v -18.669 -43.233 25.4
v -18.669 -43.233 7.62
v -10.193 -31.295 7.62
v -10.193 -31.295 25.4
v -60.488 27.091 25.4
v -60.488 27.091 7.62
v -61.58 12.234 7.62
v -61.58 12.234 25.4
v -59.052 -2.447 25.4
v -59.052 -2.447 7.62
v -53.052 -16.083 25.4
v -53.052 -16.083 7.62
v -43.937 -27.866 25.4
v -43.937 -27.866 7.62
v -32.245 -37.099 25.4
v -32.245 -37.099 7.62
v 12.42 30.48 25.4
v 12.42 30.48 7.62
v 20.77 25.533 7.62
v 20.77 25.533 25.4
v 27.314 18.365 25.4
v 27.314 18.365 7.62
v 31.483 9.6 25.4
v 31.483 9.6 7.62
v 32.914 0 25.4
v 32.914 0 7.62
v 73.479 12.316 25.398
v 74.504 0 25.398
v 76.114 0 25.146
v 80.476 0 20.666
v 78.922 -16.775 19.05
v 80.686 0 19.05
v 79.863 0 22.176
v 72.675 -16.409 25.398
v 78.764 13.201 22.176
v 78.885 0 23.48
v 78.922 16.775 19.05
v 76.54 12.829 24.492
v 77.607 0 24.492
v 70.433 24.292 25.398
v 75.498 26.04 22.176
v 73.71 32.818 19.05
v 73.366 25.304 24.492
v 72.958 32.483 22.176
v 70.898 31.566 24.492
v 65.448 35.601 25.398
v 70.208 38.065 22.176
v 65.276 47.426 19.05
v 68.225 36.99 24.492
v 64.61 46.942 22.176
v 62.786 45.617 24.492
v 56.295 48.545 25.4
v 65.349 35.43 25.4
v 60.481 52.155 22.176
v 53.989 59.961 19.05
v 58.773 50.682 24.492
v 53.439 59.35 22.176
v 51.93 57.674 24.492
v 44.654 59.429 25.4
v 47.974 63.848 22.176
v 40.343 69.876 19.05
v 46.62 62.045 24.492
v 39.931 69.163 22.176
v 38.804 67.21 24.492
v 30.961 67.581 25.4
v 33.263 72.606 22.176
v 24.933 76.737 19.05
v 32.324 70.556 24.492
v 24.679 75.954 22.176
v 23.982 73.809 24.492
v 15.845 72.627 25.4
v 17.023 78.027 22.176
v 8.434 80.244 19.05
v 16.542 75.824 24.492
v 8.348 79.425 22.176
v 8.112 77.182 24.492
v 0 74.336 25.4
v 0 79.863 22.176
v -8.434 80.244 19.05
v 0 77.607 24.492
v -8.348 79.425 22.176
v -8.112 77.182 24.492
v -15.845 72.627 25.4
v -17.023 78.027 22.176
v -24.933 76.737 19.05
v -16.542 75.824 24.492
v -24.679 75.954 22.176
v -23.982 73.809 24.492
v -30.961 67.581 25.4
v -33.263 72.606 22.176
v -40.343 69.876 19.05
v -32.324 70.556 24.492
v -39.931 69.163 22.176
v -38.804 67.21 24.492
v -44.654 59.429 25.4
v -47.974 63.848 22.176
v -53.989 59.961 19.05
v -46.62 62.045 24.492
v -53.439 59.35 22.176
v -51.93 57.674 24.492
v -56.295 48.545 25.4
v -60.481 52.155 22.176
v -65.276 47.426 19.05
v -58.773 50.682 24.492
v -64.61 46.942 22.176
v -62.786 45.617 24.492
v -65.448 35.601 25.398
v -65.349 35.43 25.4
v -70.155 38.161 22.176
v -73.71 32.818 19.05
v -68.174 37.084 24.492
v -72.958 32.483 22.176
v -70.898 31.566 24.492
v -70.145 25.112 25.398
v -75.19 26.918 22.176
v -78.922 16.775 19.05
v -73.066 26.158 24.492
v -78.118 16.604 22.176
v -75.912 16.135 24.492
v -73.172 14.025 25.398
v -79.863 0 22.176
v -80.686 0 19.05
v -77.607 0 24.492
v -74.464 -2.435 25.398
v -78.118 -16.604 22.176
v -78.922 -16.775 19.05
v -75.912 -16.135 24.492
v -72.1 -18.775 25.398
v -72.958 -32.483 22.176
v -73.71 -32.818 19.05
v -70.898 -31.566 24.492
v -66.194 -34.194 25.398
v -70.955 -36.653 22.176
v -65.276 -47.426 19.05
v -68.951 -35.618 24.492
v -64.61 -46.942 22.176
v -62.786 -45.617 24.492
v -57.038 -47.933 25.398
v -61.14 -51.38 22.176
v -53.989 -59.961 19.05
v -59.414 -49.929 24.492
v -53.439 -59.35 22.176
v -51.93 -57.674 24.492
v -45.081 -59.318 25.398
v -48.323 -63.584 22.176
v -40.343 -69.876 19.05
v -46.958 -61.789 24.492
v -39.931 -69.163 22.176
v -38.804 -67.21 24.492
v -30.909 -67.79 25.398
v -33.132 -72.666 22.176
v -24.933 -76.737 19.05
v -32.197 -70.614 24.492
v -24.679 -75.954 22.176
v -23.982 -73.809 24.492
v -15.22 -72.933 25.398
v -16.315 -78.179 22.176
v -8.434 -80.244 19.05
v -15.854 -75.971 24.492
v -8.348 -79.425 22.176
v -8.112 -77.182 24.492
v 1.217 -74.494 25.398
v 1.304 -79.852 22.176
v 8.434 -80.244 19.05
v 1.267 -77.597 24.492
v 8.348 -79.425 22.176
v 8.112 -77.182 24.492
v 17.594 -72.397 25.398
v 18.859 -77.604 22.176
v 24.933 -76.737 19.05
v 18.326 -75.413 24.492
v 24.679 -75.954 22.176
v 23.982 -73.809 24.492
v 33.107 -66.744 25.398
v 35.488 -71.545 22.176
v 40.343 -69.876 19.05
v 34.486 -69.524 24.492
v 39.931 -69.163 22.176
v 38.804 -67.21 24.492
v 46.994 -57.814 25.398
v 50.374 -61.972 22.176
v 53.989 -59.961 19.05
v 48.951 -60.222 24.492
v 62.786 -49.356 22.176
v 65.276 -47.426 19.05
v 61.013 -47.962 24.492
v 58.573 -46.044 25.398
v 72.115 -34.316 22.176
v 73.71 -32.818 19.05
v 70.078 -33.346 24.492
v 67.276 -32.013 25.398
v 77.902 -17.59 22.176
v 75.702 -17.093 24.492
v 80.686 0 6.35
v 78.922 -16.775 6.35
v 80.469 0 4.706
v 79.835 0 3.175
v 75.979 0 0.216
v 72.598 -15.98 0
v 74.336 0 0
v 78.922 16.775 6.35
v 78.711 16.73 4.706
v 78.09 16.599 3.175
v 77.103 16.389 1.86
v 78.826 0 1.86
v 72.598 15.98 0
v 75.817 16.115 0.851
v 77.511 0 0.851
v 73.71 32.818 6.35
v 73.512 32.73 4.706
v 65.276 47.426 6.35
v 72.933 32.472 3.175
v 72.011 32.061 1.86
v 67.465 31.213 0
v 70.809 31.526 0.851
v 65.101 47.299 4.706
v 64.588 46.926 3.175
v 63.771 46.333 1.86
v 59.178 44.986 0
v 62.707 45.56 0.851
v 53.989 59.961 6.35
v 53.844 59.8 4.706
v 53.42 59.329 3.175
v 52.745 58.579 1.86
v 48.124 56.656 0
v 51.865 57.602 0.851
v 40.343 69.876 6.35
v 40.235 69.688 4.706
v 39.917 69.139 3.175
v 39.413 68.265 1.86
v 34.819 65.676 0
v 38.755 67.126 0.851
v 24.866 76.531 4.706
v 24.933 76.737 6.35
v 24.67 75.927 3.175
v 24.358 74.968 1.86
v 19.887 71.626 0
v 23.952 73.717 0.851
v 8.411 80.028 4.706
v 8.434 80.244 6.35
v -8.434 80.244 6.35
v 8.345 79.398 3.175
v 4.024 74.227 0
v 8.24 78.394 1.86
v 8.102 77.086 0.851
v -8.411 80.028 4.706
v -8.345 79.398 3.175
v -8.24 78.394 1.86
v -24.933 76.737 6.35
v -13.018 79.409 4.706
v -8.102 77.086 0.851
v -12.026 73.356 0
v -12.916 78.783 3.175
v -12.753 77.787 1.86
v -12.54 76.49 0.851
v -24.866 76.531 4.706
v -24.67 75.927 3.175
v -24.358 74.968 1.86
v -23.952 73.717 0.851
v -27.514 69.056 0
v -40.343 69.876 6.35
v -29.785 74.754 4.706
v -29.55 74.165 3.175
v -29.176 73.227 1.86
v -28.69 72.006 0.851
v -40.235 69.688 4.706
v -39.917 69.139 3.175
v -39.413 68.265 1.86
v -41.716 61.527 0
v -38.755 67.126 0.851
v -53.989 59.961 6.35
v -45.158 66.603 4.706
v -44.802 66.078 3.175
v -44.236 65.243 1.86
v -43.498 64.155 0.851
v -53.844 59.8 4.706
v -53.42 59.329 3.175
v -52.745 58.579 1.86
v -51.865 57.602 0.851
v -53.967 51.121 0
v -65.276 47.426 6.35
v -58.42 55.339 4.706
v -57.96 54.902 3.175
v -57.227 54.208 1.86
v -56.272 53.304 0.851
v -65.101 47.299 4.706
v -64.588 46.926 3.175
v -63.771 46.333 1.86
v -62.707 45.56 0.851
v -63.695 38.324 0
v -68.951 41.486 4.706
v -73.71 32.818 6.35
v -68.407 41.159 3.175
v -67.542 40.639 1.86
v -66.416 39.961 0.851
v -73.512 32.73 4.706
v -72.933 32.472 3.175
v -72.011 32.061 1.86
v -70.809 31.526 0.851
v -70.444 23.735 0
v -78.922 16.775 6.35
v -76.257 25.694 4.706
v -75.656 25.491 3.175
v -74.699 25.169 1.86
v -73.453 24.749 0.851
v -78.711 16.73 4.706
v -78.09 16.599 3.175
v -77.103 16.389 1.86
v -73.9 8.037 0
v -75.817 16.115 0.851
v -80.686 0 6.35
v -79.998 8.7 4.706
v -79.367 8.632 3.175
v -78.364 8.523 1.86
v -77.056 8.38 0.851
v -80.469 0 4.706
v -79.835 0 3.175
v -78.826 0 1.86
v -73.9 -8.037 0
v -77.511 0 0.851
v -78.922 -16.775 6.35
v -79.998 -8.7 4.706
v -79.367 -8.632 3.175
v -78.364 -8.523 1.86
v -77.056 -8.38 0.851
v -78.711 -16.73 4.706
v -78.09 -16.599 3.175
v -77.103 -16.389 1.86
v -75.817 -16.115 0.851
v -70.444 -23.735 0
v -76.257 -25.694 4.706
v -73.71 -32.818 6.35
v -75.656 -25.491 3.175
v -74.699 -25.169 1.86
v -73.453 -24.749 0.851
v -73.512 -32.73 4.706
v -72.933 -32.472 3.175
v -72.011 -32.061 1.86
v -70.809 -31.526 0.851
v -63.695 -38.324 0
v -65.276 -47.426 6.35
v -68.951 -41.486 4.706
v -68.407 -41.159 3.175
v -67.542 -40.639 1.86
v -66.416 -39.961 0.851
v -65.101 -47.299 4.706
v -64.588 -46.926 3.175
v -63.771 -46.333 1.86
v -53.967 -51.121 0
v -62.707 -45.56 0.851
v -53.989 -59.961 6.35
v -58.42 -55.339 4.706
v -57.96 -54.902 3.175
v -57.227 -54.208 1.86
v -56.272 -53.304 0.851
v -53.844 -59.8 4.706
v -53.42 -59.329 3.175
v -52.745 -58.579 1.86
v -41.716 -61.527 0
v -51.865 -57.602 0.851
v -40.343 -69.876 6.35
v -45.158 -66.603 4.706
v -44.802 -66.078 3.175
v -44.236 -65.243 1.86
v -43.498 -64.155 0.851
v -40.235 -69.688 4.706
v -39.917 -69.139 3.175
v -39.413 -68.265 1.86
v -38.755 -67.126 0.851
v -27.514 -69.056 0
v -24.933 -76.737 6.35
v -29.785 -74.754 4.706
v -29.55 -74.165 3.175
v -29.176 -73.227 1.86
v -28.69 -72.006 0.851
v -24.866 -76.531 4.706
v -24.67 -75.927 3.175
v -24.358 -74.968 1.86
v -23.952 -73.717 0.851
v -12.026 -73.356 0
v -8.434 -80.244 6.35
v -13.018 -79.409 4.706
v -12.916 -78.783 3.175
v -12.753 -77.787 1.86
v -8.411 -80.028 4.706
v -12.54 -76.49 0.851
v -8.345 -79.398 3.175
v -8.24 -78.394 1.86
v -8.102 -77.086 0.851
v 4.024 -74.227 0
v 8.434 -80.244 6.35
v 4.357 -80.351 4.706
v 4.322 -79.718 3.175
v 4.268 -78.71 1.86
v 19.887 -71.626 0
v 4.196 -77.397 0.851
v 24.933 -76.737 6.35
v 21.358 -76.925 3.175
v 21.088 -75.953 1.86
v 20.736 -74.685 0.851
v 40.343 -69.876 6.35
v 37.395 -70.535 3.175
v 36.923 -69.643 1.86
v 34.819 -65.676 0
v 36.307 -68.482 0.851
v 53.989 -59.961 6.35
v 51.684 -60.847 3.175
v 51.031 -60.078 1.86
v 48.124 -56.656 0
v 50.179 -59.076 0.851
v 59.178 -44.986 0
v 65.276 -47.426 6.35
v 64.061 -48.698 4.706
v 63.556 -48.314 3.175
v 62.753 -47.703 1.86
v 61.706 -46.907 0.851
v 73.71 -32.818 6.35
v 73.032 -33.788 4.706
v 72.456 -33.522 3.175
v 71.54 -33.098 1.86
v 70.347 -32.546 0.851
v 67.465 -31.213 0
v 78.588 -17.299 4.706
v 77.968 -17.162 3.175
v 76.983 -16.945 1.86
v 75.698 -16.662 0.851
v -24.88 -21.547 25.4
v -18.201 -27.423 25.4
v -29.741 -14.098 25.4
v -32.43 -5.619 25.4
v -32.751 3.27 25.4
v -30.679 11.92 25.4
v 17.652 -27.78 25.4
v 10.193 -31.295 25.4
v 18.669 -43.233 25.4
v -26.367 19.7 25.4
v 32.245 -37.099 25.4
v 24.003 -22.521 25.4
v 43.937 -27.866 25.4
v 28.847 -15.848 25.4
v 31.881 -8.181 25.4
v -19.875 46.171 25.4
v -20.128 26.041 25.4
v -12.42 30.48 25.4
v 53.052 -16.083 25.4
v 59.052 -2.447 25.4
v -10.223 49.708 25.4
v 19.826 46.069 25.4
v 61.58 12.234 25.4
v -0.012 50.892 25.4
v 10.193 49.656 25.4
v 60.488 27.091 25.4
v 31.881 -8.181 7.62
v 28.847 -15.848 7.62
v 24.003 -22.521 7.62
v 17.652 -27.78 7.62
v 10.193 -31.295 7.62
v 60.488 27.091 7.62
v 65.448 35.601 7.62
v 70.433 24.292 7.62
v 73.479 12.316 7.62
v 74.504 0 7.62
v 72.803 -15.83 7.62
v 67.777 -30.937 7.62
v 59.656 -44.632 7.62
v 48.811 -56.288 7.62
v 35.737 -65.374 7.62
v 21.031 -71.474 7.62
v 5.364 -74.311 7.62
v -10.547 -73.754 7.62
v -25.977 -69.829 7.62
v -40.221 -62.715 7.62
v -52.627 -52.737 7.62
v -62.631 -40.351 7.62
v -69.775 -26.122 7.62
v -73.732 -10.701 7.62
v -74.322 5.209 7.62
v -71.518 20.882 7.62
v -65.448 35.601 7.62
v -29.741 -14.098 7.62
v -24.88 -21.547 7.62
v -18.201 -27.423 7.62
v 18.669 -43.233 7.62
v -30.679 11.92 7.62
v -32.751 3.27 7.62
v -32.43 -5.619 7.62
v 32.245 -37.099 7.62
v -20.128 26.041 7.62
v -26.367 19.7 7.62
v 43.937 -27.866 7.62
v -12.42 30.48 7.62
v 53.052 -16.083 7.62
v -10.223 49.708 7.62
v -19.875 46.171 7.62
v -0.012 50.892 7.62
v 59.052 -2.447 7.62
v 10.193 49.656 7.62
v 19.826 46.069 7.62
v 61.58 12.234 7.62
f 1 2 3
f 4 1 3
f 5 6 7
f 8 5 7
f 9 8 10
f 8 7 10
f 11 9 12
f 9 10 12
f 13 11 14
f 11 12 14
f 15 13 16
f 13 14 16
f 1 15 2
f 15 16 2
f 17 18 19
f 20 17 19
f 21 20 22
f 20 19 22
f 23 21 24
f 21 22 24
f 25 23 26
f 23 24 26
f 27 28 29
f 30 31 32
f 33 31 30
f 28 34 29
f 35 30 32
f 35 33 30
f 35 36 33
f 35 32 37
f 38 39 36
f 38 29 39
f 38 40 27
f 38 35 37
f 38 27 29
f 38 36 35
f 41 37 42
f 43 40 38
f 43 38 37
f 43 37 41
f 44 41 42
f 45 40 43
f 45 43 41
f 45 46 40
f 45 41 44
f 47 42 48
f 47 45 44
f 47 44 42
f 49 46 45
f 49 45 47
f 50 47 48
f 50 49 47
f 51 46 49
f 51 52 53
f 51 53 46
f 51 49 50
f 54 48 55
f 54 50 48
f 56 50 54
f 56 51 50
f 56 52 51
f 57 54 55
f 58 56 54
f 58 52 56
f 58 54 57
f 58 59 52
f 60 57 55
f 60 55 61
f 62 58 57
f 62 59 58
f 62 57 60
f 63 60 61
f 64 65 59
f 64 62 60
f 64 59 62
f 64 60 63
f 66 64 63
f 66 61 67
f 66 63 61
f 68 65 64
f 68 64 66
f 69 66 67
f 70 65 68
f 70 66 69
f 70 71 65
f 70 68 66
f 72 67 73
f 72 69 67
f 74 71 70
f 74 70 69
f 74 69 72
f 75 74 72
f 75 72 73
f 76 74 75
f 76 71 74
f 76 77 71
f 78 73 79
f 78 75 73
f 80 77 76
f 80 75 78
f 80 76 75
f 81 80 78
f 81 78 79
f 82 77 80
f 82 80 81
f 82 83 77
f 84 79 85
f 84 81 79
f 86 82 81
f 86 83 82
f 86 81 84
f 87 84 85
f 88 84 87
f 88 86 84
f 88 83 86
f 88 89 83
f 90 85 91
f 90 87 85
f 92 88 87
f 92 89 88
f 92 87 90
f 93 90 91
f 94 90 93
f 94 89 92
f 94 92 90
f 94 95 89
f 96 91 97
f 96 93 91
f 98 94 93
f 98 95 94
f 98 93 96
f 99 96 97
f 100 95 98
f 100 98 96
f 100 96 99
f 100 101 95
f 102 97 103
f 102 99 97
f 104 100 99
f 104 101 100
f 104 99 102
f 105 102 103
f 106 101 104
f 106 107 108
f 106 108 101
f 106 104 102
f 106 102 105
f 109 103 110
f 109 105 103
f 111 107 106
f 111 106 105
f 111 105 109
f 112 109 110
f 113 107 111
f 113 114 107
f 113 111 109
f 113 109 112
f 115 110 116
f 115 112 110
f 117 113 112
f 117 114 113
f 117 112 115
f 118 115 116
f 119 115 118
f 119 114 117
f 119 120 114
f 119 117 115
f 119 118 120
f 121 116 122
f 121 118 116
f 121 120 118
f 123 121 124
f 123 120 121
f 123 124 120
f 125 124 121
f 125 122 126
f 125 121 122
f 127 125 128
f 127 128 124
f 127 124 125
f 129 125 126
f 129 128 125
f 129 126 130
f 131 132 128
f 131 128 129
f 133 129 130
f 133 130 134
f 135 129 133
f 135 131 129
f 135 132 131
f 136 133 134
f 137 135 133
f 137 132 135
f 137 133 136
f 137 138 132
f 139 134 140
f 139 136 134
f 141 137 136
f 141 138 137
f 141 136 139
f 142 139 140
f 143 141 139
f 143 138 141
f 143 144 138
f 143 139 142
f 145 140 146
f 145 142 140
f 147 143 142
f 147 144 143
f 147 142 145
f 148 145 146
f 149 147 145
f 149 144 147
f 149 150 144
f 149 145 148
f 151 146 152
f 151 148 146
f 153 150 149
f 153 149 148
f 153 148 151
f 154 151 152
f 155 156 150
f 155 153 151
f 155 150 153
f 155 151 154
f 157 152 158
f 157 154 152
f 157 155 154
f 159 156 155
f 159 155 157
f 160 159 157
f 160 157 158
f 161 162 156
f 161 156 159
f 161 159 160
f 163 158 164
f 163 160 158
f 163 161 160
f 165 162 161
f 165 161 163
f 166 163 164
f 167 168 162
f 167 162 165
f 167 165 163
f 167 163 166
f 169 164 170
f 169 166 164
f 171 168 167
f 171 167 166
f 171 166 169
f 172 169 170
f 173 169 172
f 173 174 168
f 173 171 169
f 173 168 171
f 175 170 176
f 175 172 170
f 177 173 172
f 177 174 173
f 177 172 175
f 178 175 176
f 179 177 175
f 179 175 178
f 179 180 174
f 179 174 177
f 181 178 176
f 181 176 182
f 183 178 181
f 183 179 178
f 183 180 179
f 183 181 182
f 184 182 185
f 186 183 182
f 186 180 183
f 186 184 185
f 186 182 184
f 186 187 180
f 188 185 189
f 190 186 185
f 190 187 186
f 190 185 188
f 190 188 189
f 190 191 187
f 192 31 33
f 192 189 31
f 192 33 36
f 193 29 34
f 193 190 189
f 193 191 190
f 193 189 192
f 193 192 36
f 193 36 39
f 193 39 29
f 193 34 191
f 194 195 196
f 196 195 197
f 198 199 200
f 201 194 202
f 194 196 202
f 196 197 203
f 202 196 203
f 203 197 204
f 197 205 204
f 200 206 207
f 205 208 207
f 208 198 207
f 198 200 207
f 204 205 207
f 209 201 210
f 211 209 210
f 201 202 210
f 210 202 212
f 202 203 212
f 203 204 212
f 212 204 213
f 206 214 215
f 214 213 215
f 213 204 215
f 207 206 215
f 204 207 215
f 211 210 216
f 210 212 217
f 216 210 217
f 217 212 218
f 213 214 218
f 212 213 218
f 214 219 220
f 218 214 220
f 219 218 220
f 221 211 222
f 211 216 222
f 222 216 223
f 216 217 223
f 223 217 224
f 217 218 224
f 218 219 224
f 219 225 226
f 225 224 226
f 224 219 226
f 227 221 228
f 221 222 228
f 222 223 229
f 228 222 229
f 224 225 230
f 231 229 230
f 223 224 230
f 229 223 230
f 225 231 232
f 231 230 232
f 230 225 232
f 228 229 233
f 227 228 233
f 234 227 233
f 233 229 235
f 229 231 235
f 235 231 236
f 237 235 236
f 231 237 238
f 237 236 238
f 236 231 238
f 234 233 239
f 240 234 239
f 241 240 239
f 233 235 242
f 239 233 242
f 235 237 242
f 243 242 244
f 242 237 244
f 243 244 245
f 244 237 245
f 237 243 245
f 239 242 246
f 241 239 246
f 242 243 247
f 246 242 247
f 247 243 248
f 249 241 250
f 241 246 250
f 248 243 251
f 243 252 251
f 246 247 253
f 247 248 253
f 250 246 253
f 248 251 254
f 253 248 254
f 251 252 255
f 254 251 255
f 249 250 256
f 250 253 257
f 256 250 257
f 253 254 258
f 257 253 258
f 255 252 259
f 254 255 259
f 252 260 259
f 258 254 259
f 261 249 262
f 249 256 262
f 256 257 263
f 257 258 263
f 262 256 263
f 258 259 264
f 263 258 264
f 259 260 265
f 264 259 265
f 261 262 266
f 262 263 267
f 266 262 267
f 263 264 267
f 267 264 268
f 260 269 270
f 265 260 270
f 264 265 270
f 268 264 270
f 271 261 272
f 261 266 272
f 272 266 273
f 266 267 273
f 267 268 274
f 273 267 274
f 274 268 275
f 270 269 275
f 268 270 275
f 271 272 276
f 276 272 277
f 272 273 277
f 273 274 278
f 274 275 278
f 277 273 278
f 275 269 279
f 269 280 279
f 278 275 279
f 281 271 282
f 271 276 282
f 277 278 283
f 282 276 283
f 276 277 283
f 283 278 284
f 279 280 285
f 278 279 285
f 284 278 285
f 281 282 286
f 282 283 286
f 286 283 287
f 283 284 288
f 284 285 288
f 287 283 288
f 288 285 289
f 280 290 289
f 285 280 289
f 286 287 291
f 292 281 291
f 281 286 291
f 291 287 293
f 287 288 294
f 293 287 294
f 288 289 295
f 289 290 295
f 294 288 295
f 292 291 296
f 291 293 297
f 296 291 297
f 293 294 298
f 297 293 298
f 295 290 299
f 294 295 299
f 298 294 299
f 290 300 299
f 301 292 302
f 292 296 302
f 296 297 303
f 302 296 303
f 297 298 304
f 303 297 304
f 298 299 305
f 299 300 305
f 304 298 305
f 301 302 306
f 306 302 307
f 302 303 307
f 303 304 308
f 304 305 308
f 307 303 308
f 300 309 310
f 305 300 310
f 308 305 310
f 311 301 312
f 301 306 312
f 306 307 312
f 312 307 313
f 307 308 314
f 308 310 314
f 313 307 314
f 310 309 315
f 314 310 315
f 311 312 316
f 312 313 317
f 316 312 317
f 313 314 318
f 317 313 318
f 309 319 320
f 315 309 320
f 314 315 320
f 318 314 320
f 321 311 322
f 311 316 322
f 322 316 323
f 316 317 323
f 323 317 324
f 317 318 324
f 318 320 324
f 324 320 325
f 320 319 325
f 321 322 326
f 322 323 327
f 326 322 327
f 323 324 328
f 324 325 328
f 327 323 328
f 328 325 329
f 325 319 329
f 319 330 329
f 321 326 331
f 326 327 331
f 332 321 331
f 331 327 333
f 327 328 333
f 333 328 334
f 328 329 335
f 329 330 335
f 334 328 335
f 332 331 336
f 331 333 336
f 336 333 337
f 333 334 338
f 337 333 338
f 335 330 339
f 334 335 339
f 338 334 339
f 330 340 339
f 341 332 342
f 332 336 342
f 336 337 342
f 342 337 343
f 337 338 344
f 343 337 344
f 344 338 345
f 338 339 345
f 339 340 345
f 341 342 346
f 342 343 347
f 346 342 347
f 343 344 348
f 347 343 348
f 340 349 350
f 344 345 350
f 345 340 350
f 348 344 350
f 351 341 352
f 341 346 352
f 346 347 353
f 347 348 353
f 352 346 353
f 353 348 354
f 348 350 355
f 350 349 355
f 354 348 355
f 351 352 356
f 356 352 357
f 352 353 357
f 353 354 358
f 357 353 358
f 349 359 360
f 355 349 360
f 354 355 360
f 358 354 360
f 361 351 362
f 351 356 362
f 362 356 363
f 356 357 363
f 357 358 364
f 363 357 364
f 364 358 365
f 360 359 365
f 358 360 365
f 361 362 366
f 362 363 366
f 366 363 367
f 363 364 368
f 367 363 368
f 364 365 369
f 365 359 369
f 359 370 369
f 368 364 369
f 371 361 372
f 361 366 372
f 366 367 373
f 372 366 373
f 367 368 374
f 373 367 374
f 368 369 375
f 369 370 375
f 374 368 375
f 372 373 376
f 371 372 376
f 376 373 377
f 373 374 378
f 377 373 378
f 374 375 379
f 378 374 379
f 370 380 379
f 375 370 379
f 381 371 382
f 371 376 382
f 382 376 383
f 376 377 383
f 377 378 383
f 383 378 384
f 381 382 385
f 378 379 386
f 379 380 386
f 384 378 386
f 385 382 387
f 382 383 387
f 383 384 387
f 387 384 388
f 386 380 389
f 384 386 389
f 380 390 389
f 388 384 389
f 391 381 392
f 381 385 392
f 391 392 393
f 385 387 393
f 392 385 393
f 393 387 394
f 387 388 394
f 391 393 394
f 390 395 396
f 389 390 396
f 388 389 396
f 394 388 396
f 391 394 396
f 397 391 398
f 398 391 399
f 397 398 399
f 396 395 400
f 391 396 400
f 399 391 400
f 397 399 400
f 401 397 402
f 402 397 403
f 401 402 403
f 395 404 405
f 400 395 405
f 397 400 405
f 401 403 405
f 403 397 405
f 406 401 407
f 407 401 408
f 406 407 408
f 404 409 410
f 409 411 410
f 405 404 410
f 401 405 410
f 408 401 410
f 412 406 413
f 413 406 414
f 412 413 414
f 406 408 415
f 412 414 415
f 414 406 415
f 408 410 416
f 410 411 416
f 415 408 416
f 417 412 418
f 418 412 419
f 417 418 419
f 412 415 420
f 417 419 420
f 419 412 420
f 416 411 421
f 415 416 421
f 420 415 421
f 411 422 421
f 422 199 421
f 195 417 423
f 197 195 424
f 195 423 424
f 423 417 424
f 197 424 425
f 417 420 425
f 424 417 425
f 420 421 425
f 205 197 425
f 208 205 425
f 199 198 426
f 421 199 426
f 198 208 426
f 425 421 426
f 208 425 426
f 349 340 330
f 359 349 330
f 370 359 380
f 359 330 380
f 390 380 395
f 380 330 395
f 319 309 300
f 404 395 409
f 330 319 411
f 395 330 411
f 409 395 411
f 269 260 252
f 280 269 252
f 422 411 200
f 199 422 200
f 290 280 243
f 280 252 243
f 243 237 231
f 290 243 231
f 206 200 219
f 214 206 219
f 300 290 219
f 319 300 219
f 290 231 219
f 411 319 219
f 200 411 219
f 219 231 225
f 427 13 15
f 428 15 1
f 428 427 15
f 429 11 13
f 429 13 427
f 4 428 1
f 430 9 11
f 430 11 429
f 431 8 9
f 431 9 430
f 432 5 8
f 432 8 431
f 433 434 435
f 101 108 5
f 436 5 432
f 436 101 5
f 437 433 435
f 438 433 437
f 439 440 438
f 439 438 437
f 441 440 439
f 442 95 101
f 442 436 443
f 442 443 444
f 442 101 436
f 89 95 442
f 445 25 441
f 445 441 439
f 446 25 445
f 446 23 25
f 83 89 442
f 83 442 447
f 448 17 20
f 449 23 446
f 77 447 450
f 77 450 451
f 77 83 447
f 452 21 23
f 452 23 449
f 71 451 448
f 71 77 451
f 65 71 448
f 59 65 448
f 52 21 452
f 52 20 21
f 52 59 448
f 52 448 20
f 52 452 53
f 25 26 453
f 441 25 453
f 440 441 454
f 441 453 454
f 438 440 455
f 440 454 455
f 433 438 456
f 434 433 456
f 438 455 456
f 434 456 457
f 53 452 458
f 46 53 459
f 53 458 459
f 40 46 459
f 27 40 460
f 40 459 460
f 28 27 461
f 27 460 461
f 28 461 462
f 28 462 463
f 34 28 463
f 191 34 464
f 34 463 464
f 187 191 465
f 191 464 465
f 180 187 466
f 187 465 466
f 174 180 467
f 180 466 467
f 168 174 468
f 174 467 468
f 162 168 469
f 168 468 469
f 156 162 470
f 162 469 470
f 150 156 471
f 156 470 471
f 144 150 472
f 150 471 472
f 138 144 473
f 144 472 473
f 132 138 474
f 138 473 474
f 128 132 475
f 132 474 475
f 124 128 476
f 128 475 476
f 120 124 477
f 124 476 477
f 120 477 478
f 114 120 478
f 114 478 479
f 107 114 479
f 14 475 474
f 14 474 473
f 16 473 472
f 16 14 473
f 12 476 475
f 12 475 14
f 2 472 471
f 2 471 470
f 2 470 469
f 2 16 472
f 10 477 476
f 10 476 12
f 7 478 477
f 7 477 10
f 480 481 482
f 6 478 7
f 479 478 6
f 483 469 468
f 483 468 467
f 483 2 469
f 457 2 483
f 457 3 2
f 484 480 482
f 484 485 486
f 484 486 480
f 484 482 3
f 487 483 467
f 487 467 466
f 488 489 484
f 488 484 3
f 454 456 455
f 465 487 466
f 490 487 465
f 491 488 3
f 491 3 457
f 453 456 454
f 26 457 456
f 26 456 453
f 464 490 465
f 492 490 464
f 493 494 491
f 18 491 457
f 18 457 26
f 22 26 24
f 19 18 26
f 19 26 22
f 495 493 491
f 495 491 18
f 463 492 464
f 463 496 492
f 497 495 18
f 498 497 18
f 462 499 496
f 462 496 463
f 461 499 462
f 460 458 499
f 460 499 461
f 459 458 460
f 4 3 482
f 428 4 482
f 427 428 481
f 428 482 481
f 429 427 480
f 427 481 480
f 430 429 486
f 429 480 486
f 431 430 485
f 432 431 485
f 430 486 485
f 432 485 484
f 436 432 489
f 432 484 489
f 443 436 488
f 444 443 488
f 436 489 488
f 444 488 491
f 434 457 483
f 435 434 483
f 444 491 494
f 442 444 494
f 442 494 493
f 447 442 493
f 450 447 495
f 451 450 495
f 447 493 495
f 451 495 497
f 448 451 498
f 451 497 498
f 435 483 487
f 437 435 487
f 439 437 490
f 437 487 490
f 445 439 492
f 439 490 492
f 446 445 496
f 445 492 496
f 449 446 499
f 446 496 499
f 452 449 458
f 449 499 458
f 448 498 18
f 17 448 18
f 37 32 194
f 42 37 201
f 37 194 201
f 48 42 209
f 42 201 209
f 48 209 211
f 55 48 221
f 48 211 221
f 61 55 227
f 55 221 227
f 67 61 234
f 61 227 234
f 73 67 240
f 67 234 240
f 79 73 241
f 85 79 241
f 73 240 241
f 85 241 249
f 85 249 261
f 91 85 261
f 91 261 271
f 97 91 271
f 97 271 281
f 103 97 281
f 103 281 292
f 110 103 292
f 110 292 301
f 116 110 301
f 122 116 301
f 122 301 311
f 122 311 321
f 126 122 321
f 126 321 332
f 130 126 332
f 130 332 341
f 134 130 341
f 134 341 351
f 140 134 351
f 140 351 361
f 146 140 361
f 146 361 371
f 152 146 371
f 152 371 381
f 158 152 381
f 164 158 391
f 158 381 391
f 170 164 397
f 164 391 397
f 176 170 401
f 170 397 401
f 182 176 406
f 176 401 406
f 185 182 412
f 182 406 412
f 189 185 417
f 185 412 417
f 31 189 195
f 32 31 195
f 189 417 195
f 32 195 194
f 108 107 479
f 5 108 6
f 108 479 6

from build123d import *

# Parameters (mm, degrees)
F0_R     = 80.6856028543
F1_DEPTH = 25.4
F2_DEPTH = 7.62


# Not quite as in the source:
# - a fillet or chamfer that OpenCascade refuses, or shapes differently, is made with other operations: its cross-section is extruded or revolved along the edge and cut away or added


with BuildPart() as f1:
    # F0 (on Top) → F1 (new body)
    with BuildSketch(Plane.XY):
        Circle(F0_R)
        with BuildLine():
            ThreePointArc((65.4481636504, 35.6006994652), (72.2046857665, 18.3672338959), (74.5041738939, 0))
            ThreePointArc((74.5041738939, 0), (-18.3672338959, -72.2046857665), (-65.4481636504, 35.6006994652))
            ThreePointArc((-65.4481636504, 35.6006994652), (0, 74.5041738939), (65.4481636504, 35.6006994652))
        make_face(mode=Mode.SUBTRACT)
        with BuildLine():
            Line((60.4875776026, 27.0912961706), (65.4481636504, 35.6006994652))
            ThreePointArc((65.4481636504, 35.6006994652), (0, 74.5041738939), (-65.4481636504, 35.6006994652))
            Line((-65.4481636504, 35.6006994652), (-60.4875776026, 27.0912961706))
            ThreePointArc((-60.4875776026, 27.0912961706), (-53.0522524477, -16.0833720047), (-18.6689998955, -43.2334728539))
            Line((-18.6689998955, -43.2334728539), (-10.1934868934, -31.2953587769))
            ThreePointArc((-10.1934868934, -31.2953587769), (-32.8922648635, -1.1855666041), (-12.4201237339, 30.4802753015))
            Line((-12.4201237339, 30.4802753015), (-19.8746794874, 46.1712545885))
            ThreePointArc((-19.8746794874, 46.1712545885), (-0.0120295356, 50.8915609087), (19.8259803172, 46.0687484571))
            Line((19.8259803172, 46.0687484571), (12.4201237339, 30.4802753015))
            ThreePointArc((12.4201237339, 30.4802753015), (27.3138970192, 18.3645769254), (32.9136241703, 0))
            ThreePointArc((32.9136241703, 0), (26.6346696302, -19.3365206207), (10.1934868934, -31.2953587769))
            Line((10.1934868934, -31.2953587769), (18.6689998955, -43.2334728539))
            ThreePointArc((18.6689998955, -43.2334728539), (53.0522524477, -16.0833720047), (60.4875776026, 27.0912961706))
        make_face()
    extrude(amount=F1_DEPTH)

    # F0 (on Top) → F2 (join)
    with BuildSketch(Plane.XY):
        with BuildLine():
            ThreePointArc((-10.1934868934, -31.2953587769), (0, -32.9136241703), (10.1934868934, -31.2953587769))
            ThreePointArc((10.1934868934, -31.2953587769), (26.6346696302, -19.3365206207), (32.9136241703, 0))
            ThreePointArc((32.9136241703, 0), (27.3138970192, 18.3645769254), (12.4201237339, 30.4802753015))
            ThreePointArc((12.4201237339, 30.4802753015), (0, 32.9136241703), (-12.4201237339, 30.4802753015))
            ThreePointArc((-12.4201237339, 30.4802753015), (-32.8922648635, -1.1855666041), (-10.1934868934, -31.2953587769))
        make_face()
        with BuildLine():
            Line((-19.8746794874, 46.1712545885), (-12.4201237339, 30.4802753015))
            ThreePointArc((-12.4201237339, 30.4802753015), (0, 32.9136241703), (12.4201237339, 30.4802753015))
            Line((12.4201237339, 30.4802753015), (19.8259803172, 46.0687484571))
            ThreePointArc((19.8259803172, 46.0687484571), (-0.0120295356, 50.8915609087), (-19.8746794874, 46.1712545885))
        make_face()
        with BuildLine():
            ThreePointArc((-65.4481636504, 35.6006994652), (-18.3672338959, -72.2046857665), (74.5041738939, 0))
            ThreePointArc((74.5041738939, 0), (72.2046857665, 18.3672338959), (65.4481636504, 35.6006994652))
            Line((65.4481636504, 35.6006994652), (60.4875776026, 27.0912961706))
            ThreePointArc((60.4875776026, 27.0912961706), (53.0522524477, -16.0833720047), (18.6689998955, -43.2334728539))
            Line((18.6689998955, -43.2334728539), (10.1934868934, -31.2953587769))
            ThreePointArc((10.1934868934, -31.2953587769), (0, -32.9136241703), (-10.1934868934, -31.2953587769))
            Line((-10.1934868934, -31.2953587769), (-18.6689998955, -43.2334728539))
            ThreePointArc((-18.6689998955, -43.2334728539), (-53.0522524477, -16.0833720047), (-60.4875776026, 27.0912961706))
            Line((-60.4875776026, 27.0912961706), (-65.4481636504, 35.6006994652))
        make_face()
    extrude(amount=F2_DEPTH)

    # F3: fillet of radius 6.35 on 2 edges, made by hand

    # F3_s1 → F3_t2 (revolve, cut)
    with BuildSketch(Plane.XZ):
        with BuildLine():
            ThreePointArc((80.6856028543, 19.05), (78.8257309148, 23.5401280605), (74.3356028543, 25.4))
            Line((74.3356028543, 25.4), (74.3356028543, 25.527))
            Line((74.3356028543, 25.527), (80.8126028543, 25.527))
            Line((80.8126028543, 25.527), (80.8126028543, 19.05))
            Line((80.8126028543, 19.05), (80.6856028543, 19.05))
        make_face()
    revolve(axis=Axis((0, 0, 25.4), (0, 0, 1)), mode=Mode.SUBTRACT)

    # F3_s3 → F3_t4 (revolve, cut)
    with BuildSketch(Plane.XZ):
        with BuildLine():
            ThreePointArc((80.6856028543, 6.35), (78.8257309148, 1.8598719395), (74.3356028543, 0))
            Line((74.3356028543, 0), (74.3356028543, -0.127))
            Line((74.3356028543, -0.127), (80.8126028543, -0.127))
            Line((80.8126028543, -0.127), (80.8126028543, 6.35))
            Line((80.8126028543, 6.35), (80.6856028543, 6.35))
        make_face()
    revolve(axis=Axis((0, 0, 0), (0, 0, 1)), mode=Mode.SUBTRACT)


solid = f1.part
